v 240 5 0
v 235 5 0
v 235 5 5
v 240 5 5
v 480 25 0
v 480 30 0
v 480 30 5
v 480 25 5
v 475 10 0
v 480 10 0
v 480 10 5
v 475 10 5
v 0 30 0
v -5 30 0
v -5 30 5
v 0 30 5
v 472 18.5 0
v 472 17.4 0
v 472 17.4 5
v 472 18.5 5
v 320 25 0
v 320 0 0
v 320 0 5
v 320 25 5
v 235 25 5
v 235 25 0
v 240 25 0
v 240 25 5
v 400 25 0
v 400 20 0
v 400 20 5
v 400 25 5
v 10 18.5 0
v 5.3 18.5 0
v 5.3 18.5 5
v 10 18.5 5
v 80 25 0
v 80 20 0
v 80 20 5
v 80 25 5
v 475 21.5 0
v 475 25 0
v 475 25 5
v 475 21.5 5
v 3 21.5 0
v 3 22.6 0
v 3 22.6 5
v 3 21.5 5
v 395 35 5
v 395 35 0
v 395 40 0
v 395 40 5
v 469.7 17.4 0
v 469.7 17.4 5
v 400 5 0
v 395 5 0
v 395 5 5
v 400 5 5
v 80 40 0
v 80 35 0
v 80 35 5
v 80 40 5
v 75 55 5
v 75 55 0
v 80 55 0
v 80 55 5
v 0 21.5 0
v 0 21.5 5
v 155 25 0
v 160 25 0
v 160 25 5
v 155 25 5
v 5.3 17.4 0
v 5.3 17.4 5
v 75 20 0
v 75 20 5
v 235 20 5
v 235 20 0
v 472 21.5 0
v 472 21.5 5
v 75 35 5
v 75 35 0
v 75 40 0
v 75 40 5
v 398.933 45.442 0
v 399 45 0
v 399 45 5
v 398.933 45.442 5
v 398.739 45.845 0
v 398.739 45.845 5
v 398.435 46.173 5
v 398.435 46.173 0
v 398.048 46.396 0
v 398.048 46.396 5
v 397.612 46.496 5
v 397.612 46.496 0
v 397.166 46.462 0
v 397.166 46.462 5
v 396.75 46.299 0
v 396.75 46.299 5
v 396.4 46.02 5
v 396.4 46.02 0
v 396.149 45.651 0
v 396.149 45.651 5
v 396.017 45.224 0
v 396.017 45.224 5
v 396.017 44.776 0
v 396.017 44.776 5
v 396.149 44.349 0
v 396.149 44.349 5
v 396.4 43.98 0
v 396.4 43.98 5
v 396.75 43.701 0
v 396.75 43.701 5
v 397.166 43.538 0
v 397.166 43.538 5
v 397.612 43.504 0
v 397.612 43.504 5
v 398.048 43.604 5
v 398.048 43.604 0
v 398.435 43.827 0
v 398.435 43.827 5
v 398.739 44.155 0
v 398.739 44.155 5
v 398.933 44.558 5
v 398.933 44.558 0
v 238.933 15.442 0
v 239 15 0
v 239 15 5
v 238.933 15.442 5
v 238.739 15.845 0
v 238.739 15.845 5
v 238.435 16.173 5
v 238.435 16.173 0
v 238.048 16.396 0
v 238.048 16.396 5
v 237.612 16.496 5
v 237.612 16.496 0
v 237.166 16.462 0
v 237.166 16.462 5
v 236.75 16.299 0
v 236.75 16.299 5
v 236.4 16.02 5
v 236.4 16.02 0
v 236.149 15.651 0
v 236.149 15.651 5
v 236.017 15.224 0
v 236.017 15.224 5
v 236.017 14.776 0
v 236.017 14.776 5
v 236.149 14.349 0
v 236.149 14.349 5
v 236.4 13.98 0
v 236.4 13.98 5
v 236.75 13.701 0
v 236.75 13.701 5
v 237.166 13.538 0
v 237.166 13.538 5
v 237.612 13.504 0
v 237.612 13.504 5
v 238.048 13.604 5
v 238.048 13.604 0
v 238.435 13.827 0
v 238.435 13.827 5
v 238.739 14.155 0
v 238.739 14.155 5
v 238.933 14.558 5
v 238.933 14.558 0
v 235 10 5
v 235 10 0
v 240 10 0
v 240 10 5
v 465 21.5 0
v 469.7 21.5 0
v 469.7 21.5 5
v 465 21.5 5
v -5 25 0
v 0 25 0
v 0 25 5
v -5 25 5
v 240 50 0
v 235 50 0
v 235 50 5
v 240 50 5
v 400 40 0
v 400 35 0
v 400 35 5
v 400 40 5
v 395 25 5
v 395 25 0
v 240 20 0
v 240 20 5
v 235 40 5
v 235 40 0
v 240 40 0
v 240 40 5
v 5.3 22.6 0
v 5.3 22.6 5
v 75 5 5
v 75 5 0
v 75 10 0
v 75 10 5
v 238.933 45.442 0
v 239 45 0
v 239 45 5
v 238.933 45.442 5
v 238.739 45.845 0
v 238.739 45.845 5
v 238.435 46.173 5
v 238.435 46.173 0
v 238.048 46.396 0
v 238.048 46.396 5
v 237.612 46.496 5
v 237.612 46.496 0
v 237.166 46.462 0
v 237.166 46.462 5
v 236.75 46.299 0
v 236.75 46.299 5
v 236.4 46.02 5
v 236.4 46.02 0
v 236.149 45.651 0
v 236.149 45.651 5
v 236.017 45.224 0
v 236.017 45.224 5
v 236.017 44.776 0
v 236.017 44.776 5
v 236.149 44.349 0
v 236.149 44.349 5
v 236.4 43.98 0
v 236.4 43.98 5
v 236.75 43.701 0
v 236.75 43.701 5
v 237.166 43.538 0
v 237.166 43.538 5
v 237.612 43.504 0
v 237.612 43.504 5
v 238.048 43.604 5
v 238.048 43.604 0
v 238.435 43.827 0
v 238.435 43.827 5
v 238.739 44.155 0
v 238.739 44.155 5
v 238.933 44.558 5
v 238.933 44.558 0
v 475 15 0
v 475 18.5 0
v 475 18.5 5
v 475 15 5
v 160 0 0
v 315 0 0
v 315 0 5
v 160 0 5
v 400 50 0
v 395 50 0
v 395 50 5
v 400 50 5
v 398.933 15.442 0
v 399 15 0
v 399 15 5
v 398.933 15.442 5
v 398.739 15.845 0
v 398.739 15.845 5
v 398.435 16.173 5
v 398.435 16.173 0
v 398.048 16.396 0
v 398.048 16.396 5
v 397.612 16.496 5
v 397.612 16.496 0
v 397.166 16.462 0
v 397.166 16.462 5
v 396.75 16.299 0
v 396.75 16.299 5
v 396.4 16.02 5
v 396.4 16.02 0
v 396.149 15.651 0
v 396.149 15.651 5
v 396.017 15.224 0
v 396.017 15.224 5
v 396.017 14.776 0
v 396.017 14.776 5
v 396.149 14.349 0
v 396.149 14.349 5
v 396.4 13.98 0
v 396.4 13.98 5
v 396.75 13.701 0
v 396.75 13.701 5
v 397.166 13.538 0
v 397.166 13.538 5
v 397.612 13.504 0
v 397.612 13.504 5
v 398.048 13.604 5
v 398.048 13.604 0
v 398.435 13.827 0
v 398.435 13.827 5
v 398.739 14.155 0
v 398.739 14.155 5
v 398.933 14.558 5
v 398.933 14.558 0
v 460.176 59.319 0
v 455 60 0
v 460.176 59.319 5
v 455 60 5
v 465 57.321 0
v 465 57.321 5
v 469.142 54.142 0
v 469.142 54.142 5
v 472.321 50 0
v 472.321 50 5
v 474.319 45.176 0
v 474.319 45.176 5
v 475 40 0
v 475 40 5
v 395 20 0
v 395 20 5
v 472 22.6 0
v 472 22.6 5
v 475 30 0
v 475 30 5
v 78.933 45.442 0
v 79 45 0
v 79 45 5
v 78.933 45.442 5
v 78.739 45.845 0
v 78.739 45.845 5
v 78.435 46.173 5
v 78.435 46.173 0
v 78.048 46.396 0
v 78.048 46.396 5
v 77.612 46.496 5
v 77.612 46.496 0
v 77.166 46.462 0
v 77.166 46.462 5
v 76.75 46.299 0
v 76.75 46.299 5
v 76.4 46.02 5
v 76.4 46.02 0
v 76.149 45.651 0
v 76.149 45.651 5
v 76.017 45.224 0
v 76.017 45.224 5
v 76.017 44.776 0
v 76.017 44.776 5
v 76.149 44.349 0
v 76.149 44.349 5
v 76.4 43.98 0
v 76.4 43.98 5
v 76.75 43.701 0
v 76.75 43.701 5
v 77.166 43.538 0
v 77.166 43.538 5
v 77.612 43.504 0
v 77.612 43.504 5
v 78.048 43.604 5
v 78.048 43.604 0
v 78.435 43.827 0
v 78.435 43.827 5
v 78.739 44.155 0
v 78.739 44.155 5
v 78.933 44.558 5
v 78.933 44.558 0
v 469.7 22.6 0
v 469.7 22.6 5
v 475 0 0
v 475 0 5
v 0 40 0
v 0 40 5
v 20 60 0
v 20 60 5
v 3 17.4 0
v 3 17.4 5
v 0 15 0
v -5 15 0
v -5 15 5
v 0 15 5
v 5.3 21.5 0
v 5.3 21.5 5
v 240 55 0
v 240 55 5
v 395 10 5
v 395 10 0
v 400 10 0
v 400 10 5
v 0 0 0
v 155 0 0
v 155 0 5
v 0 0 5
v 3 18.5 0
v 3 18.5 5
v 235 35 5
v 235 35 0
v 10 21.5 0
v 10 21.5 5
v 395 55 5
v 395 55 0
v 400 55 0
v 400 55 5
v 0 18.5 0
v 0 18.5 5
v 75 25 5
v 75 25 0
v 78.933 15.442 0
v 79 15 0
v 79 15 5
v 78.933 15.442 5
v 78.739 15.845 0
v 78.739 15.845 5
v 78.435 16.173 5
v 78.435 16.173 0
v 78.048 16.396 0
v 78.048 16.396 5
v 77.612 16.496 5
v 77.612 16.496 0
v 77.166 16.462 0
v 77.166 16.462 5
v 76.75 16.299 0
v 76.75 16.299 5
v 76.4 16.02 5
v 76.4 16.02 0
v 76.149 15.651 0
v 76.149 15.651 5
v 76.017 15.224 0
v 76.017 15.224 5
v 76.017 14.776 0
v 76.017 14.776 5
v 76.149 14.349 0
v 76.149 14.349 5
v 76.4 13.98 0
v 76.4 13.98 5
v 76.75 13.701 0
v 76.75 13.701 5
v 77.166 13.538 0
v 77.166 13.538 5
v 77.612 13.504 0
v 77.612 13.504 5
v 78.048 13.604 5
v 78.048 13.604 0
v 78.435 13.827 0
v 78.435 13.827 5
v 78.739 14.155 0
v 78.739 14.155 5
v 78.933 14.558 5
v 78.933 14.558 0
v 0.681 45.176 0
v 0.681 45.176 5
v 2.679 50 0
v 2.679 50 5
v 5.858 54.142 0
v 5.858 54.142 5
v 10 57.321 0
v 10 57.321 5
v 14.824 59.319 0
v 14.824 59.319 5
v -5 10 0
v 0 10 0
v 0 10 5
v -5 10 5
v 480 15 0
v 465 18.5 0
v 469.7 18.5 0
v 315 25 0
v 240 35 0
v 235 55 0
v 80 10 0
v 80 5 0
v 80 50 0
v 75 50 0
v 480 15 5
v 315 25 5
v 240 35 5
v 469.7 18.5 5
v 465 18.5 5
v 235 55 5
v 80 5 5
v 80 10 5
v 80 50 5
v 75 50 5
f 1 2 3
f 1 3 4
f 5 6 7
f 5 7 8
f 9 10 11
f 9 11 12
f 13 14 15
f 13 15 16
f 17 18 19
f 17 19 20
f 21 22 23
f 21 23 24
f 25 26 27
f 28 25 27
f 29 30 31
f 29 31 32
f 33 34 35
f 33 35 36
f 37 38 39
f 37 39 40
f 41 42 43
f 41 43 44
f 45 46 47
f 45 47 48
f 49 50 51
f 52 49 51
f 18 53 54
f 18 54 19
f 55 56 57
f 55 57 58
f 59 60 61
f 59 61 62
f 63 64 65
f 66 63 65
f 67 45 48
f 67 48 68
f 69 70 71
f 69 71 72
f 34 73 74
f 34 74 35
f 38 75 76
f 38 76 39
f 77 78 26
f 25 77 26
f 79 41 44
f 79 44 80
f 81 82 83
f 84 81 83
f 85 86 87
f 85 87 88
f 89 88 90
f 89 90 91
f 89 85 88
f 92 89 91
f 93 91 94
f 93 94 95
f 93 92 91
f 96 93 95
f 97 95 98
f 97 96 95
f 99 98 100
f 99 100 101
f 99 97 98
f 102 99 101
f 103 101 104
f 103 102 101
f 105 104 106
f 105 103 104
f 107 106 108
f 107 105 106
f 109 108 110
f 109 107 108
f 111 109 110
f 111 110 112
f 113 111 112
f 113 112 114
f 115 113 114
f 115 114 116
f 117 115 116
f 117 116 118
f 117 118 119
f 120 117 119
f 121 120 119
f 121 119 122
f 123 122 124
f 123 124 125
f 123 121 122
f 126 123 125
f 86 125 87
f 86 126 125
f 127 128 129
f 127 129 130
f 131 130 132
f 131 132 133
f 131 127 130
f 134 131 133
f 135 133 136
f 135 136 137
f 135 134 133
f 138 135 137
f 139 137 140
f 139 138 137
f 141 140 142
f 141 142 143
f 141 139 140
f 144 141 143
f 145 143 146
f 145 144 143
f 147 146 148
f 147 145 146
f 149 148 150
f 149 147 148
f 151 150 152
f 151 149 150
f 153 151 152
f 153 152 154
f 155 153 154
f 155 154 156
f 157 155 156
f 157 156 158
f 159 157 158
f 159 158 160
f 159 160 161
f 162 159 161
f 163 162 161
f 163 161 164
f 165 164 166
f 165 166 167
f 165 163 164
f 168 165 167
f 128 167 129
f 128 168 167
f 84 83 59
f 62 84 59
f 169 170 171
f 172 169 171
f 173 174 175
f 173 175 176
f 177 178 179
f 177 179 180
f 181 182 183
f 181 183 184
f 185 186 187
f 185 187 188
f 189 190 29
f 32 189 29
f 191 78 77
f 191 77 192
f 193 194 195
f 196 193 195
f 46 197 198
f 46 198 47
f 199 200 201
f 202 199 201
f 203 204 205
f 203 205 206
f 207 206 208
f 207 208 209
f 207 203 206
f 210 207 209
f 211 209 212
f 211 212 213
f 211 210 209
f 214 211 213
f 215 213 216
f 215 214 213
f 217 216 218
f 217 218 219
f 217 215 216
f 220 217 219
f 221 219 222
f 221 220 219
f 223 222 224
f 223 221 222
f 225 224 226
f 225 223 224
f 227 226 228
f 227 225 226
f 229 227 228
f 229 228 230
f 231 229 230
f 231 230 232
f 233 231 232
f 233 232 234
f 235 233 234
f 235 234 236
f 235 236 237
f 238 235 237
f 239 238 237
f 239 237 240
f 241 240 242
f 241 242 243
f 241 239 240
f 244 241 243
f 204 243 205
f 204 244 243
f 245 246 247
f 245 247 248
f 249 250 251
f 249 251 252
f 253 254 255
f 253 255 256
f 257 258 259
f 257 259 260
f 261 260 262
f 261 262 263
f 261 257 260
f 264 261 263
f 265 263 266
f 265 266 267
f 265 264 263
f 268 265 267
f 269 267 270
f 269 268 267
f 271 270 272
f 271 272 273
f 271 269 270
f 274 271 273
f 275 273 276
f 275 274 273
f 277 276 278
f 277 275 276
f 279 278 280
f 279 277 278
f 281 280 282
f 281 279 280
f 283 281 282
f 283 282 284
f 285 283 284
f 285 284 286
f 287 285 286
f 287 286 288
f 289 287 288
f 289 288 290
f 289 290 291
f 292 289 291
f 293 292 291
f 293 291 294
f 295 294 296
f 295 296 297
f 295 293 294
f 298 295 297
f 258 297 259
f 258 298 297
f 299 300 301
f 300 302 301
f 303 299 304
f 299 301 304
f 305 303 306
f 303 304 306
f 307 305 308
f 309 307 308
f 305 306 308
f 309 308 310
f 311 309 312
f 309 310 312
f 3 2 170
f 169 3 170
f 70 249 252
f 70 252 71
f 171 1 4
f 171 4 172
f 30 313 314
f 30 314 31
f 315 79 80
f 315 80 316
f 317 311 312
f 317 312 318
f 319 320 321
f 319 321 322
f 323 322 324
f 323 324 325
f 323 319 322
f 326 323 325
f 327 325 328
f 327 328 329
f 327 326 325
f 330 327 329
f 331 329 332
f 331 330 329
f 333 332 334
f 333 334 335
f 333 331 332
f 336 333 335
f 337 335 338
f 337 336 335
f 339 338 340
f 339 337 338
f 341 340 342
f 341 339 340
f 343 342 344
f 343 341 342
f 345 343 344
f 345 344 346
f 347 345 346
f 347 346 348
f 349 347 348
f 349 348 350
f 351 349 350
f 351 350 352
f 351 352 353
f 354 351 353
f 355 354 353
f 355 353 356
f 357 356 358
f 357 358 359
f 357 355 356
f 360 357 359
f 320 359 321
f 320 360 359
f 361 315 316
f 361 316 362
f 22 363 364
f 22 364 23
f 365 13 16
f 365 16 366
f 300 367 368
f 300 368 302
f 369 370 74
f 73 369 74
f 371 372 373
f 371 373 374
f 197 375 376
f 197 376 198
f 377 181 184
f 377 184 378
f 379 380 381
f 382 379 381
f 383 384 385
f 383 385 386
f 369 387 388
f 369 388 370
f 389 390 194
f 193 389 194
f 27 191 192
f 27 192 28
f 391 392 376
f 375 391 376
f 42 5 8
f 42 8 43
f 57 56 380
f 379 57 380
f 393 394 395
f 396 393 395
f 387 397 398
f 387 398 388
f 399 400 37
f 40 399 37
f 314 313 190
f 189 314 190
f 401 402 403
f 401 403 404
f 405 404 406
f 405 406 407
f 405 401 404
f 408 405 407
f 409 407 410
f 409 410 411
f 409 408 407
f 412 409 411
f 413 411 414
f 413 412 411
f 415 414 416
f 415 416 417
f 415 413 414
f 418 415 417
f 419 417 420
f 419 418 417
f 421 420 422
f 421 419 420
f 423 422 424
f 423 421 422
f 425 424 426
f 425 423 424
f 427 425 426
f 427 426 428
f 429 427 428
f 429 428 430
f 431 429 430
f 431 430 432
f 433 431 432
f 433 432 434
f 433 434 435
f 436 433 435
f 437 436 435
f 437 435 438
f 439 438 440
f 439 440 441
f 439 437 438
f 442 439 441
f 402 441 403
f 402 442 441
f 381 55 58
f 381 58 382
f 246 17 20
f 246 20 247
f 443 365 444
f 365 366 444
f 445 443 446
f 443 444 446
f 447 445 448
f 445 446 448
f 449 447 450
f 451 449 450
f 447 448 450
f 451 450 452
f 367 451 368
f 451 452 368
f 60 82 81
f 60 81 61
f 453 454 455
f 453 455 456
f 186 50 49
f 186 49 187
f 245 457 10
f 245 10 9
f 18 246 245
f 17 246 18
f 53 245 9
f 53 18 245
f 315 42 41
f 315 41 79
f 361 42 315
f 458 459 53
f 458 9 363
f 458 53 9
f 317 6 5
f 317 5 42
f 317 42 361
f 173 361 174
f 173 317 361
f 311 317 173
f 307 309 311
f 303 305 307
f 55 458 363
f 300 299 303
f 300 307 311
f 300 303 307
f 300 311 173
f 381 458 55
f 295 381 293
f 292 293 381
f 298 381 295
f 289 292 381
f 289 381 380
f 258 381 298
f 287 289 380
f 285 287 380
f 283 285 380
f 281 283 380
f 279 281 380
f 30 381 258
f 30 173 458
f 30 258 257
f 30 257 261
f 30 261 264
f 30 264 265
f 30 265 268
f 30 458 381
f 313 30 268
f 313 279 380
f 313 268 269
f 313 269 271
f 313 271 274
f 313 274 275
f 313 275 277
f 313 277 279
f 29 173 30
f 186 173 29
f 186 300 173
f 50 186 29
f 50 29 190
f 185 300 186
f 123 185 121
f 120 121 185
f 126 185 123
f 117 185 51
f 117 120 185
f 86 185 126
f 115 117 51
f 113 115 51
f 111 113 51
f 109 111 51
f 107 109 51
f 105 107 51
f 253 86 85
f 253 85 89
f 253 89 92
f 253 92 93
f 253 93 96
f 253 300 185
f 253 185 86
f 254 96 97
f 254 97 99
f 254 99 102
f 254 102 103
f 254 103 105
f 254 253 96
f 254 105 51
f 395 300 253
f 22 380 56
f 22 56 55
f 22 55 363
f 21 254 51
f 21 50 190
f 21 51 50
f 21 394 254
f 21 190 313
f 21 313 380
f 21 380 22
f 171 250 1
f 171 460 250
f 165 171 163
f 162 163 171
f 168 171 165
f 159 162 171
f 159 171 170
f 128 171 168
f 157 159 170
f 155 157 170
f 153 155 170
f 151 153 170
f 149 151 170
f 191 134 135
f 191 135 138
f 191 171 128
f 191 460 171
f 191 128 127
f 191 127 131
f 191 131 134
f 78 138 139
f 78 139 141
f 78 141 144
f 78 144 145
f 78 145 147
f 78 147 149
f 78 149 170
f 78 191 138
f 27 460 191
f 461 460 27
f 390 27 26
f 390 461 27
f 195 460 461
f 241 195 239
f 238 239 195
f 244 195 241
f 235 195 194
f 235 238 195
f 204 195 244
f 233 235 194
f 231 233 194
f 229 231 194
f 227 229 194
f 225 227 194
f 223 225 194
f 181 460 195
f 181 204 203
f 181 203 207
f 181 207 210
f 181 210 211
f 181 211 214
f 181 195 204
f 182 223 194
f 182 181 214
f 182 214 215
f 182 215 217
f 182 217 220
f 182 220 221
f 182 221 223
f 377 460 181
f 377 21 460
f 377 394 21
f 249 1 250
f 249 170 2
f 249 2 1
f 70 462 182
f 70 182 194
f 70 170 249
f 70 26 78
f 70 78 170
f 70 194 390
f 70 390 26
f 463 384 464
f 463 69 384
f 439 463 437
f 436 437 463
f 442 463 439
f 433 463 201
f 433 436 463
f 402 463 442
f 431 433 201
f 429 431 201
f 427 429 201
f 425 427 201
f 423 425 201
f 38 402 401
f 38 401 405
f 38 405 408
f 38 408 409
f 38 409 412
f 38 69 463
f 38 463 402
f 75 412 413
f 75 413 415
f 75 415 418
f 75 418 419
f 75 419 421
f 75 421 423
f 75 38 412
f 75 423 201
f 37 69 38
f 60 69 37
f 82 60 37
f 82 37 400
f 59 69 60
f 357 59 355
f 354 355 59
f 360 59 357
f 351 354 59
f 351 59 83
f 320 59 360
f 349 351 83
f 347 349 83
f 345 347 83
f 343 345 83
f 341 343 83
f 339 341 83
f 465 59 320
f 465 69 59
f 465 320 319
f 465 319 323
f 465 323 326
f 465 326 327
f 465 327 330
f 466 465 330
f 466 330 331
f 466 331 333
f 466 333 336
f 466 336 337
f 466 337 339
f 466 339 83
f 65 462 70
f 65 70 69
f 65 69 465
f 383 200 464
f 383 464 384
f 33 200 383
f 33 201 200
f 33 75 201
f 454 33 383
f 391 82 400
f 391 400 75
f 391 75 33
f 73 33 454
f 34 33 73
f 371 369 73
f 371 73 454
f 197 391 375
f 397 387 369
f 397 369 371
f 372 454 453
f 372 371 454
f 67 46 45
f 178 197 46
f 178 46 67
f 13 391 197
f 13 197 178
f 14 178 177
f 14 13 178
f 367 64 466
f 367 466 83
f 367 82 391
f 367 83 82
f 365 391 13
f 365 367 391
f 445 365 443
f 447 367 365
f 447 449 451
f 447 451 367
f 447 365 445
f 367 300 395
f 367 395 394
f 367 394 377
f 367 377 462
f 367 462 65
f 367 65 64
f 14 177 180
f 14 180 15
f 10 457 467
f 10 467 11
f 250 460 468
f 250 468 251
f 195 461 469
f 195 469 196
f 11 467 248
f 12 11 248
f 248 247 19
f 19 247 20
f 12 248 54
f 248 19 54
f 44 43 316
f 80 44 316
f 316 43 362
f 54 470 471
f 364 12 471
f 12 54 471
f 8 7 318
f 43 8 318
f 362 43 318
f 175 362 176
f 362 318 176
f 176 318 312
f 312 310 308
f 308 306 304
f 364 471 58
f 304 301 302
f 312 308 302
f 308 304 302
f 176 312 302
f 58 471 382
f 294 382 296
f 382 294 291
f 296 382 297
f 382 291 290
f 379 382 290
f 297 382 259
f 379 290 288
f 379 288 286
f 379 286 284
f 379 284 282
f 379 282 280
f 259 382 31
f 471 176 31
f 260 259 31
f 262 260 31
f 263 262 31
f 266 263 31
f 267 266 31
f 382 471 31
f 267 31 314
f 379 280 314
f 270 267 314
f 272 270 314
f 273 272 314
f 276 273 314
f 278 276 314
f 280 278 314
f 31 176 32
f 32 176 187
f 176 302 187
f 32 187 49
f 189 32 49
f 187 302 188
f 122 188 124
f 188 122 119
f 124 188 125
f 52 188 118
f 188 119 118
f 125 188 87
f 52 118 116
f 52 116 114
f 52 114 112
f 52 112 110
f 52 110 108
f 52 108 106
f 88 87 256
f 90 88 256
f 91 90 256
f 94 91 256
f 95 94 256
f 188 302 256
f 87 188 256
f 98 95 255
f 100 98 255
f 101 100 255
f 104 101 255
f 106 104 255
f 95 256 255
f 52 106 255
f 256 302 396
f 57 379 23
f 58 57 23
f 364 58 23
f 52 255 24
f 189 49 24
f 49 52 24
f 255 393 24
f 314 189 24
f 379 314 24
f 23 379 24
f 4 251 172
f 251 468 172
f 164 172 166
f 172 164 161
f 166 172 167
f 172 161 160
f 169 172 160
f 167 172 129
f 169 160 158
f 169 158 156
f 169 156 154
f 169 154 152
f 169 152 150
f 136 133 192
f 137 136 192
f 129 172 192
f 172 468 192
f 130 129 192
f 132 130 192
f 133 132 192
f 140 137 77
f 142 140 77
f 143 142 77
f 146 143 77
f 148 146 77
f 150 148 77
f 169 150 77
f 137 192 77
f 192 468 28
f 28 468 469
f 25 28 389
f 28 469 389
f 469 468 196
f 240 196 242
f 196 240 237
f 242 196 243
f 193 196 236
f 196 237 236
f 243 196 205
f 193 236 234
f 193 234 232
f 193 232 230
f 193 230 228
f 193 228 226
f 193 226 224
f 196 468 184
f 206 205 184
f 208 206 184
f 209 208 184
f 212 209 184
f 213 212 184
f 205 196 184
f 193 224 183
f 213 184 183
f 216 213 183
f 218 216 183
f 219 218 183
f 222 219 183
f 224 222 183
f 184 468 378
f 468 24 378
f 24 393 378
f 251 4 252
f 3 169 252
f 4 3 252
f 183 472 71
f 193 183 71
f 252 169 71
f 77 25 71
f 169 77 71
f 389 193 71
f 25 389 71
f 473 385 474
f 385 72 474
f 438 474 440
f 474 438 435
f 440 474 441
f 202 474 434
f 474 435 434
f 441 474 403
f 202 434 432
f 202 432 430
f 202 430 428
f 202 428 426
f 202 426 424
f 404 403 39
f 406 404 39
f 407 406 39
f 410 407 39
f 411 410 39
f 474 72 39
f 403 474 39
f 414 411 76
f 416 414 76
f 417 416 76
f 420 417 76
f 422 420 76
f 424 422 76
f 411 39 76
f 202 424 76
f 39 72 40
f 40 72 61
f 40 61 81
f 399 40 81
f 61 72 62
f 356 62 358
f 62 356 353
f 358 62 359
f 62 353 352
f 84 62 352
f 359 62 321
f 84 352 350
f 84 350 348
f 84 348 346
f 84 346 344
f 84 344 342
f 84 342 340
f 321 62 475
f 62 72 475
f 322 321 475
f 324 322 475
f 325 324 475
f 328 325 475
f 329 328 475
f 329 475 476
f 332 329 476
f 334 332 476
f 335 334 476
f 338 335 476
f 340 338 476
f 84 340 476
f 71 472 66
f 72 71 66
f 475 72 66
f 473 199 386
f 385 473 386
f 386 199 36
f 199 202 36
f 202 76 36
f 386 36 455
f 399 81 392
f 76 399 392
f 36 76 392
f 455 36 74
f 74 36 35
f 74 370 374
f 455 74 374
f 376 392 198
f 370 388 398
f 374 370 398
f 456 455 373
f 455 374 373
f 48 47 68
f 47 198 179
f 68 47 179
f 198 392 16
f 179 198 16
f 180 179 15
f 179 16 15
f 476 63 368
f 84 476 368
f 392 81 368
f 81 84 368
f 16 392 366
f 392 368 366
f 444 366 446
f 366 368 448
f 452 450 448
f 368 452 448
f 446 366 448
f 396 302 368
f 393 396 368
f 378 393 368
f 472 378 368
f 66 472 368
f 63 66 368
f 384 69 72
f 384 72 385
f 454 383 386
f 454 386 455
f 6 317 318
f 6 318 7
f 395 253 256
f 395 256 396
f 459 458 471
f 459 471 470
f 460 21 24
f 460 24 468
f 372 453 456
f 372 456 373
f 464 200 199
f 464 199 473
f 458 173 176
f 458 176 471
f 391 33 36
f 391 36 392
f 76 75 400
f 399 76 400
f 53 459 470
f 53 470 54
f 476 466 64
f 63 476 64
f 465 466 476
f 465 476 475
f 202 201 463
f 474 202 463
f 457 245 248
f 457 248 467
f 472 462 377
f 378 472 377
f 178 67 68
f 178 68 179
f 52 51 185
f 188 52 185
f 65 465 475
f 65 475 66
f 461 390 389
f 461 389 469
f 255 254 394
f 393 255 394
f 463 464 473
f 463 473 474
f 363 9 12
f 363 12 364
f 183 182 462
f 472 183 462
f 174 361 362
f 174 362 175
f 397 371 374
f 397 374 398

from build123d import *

# Parameters (mm, degrees)
ESQUISSE1_R        = 1.5
ESQUISSE1_W        = 5
ESQUISSE1_H        = 5
BOSS_EXTRU_1_DEPTH = 5
CONG_1_R           = 20


with BuildPart() as part:
    # Esquisse1 → Boss.-Extru.1 (new body)
    with BuildSketch(Plane.XY):
        Polygon((0, 21.5), (0, 25), (-5, 25), (-5, 30), (0, 30), (0, 60), (475, 60), (475, 30), (480, 30), (480, 25), (475, 25), (475, 21.5), (472, 21.5), (472, 22.6), (469.7, 22.6), (469.7, 21.5), (465, 21.5), (465, 18.5), (469.7, 18.5), (469.7, 17.4), (472, 17.4), (472, 18.5), (475, 18.5), (475, 15), (480, 15), (480, 10), (475, 10), (475, 0), (320, 0), (320, 25), (315, 25), (315, 0), (160, 0), (160, 25), (155, 25), (155, 0), (0, 0), (0, 10), (-5, 10), (-5, 15), (0, 15), (0, 18.5), (3, 18.5), (3, 17.4), (5.3, 17.4), (5.3, 18.5), (10, 18.5), (10, 21.5), (5.3, 21.5), (5.3, 22.6), (3, 22.6), (3, 21.5), align=None)
        with Locations((397.5, 15)):
            Circle(ESQUISSE1_R, mode=Mode.SUBTRACT)
        with Locations((397.5, 45)):
            Circle(ESQUISSE1_R, mode=Mode.SUBTRACT)
        with Locations((237.5, 15)):
            Circle(ESQUISSE1_R, mode=Mode.SUBTRACT)
        with Locations((237.5, 45)):
            Circle(ESQUISSE1_R, mode=Mode.SUBTRACT)
        with Locations((77.5, 15)):
            Circle(ESQUISSE1_R, mode=Mode.SUBTRACT)
        with Locations((77.5, 45)):
            Circle(ESQUISSE1_R, mode=Mode.SUBTRACT)
        with Locations((397.5, 7.5)):
            Rectangle(ESQUISSE1_W, ESQUISSE1_H, mode=Mode.SUBTRACT)
        with Locations((397.5, 22.5)):
            Rectangle(ESQUISSE1_W, ESQUISSE1_H, mode=Mode.SUBTRACT)
        with Locations((397.5, 37.5)):
            Rectangle(ESQUISSE1_W, ESQUISSE1_H, mode=Mode.SUBTRACT)
        with Locations((397.5, 52.5)):
            Rectangle(ESQUISSE1_W, ESQUISSE1_H, mode=Mode.SUBTRACT)
        with Locations((237.5, 7.5)):
            Rectangle(ESQUISSE1_W, ESQUISSE1_H, mode=Mode.SUBTRACT)
        with Locations((237.5, 22.5)):
            Rectangle(ESQUISSE1_W, ESQUISSE1_H, mode=Mode.SUBTRACT)
        with Locations((237.5, 37.5)):
            Rectangle(ESQUISSE1_W, ESQUISSE1_H, mode=Mode.SUBTRACT)
        with Locations((237.5, 52.5)):
            Rectangle(ESQUISSE1_W, ESQUISSE1_H, mode=Mode.SUBTRACT)
        with Locations((77.5, 7.5)):
            Rectangle(ESQUISSE1_W, ESQUISSE1_H, mode=Mode.SUBTRACT)
        with Locations((77.5, 22.5)):
            Rectangle(ESQUISSE1_W, ESQUISSE1_H, mode=Mode.SUBTRACT)
        with Locations((77.5, 37.5)):
            Rectangle(ESQUISSE1_W, ESQUISSE1_H, mode=Mode.SUBTRACT)
        with Locations((77.5, 52.5)):
            Rectangle(ESQUISSE1_W, ESQUISSE1_H, mode=Mode.SUBTRACT)
    extrude(amount=BOSS_EXTRU_1_DEPTH)

    # Congé1
    cong_1_edges = [part.edges().sort_by_distance(p)[0] for p in [
        (0, 60, 2.5),
        (475, 60, 2.5),
    ]]
    fillet(cong_1_edges, radius=CONG_1_R)


solid = part.part
